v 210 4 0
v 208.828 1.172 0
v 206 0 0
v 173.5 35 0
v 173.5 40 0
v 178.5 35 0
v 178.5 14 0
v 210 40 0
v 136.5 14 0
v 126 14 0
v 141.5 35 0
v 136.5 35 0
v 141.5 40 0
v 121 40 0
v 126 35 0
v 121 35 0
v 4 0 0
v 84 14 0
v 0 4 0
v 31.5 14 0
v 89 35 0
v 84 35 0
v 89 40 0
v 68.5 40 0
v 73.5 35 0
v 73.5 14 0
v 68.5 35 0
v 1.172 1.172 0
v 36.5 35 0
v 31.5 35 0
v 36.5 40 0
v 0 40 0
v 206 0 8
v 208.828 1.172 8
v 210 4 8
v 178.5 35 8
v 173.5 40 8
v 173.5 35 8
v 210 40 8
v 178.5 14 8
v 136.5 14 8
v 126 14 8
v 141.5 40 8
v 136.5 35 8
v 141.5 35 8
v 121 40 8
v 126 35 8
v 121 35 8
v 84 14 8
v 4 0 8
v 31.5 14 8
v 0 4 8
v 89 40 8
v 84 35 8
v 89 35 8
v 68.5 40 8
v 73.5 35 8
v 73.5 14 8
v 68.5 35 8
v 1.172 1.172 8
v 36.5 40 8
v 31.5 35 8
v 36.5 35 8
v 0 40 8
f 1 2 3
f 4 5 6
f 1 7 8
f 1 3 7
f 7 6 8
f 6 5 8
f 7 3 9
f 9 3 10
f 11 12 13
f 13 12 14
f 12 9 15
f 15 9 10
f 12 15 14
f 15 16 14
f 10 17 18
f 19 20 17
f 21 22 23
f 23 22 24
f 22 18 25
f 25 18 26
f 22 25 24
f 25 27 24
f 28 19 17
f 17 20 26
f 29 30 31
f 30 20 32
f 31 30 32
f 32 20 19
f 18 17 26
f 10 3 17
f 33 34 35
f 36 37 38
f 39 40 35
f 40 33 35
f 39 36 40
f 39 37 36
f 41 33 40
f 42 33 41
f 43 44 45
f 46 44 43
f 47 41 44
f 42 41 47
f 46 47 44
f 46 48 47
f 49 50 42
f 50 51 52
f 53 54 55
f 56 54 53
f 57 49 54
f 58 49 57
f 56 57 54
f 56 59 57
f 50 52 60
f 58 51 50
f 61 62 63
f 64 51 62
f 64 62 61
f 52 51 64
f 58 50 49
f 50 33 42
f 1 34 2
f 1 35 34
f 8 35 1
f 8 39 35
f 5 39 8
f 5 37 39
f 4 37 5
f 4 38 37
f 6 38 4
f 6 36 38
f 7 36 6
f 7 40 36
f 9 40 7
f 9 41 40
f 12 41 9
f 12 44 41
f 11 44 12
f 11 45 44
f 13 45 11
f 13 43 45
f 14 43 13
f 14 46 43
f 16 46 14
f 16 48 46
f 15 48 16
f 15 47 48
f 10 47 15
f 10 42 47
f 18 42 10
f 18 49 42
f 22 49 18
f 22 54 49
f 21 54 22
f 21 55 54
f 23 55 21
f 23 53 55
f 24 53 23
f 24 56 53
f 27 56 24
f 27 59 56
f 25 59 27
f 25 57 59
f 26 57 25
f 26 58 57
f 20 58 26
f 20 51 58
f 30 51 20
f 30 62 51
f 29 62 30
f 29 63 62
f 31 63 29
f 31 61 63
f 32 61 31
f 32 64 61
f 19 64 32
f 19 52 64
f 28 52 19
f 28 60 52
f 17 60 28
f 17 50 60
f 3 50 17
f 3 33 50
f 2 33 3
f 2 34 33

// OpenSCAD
$fn = 32;

// ----------------------------------------------------------------------
// Oversize slot bar: 210 mm bar with 3 oversize windows
// ----------------------------------------------------------------------

// --- parameters (mm) ---
profile_height = 8;       // extrusion height
profile_points = 32;      // points of the closed outline

profile = [[0, 4], [1.172, 1.172], [4, 0], [206, 0], [208.828, 1.172], [210, 4], [210, 40], [173.5, 40], [173.5, 35], [178.5, 35], [178.5, 14], [136.5, 14], [136.5, 35], [141.5, 35], [141.5, 40], [121, 40], [121, 35], [126, 35], [126, 14], [84, 14], [84, 35], [89, 35], [89, 40], [68.5, 40], [68.5, 35], [73.5, 35], [73.5, 14], [31.5, 14], [31.5, 35], [36.5, 35], [36.5, 40], [0, 40]];  // single closed polygon, 32 points, counter clockwise

// --- the one profile operation ---
linear_extrude(height = profile_height) polygon(points = profile);
